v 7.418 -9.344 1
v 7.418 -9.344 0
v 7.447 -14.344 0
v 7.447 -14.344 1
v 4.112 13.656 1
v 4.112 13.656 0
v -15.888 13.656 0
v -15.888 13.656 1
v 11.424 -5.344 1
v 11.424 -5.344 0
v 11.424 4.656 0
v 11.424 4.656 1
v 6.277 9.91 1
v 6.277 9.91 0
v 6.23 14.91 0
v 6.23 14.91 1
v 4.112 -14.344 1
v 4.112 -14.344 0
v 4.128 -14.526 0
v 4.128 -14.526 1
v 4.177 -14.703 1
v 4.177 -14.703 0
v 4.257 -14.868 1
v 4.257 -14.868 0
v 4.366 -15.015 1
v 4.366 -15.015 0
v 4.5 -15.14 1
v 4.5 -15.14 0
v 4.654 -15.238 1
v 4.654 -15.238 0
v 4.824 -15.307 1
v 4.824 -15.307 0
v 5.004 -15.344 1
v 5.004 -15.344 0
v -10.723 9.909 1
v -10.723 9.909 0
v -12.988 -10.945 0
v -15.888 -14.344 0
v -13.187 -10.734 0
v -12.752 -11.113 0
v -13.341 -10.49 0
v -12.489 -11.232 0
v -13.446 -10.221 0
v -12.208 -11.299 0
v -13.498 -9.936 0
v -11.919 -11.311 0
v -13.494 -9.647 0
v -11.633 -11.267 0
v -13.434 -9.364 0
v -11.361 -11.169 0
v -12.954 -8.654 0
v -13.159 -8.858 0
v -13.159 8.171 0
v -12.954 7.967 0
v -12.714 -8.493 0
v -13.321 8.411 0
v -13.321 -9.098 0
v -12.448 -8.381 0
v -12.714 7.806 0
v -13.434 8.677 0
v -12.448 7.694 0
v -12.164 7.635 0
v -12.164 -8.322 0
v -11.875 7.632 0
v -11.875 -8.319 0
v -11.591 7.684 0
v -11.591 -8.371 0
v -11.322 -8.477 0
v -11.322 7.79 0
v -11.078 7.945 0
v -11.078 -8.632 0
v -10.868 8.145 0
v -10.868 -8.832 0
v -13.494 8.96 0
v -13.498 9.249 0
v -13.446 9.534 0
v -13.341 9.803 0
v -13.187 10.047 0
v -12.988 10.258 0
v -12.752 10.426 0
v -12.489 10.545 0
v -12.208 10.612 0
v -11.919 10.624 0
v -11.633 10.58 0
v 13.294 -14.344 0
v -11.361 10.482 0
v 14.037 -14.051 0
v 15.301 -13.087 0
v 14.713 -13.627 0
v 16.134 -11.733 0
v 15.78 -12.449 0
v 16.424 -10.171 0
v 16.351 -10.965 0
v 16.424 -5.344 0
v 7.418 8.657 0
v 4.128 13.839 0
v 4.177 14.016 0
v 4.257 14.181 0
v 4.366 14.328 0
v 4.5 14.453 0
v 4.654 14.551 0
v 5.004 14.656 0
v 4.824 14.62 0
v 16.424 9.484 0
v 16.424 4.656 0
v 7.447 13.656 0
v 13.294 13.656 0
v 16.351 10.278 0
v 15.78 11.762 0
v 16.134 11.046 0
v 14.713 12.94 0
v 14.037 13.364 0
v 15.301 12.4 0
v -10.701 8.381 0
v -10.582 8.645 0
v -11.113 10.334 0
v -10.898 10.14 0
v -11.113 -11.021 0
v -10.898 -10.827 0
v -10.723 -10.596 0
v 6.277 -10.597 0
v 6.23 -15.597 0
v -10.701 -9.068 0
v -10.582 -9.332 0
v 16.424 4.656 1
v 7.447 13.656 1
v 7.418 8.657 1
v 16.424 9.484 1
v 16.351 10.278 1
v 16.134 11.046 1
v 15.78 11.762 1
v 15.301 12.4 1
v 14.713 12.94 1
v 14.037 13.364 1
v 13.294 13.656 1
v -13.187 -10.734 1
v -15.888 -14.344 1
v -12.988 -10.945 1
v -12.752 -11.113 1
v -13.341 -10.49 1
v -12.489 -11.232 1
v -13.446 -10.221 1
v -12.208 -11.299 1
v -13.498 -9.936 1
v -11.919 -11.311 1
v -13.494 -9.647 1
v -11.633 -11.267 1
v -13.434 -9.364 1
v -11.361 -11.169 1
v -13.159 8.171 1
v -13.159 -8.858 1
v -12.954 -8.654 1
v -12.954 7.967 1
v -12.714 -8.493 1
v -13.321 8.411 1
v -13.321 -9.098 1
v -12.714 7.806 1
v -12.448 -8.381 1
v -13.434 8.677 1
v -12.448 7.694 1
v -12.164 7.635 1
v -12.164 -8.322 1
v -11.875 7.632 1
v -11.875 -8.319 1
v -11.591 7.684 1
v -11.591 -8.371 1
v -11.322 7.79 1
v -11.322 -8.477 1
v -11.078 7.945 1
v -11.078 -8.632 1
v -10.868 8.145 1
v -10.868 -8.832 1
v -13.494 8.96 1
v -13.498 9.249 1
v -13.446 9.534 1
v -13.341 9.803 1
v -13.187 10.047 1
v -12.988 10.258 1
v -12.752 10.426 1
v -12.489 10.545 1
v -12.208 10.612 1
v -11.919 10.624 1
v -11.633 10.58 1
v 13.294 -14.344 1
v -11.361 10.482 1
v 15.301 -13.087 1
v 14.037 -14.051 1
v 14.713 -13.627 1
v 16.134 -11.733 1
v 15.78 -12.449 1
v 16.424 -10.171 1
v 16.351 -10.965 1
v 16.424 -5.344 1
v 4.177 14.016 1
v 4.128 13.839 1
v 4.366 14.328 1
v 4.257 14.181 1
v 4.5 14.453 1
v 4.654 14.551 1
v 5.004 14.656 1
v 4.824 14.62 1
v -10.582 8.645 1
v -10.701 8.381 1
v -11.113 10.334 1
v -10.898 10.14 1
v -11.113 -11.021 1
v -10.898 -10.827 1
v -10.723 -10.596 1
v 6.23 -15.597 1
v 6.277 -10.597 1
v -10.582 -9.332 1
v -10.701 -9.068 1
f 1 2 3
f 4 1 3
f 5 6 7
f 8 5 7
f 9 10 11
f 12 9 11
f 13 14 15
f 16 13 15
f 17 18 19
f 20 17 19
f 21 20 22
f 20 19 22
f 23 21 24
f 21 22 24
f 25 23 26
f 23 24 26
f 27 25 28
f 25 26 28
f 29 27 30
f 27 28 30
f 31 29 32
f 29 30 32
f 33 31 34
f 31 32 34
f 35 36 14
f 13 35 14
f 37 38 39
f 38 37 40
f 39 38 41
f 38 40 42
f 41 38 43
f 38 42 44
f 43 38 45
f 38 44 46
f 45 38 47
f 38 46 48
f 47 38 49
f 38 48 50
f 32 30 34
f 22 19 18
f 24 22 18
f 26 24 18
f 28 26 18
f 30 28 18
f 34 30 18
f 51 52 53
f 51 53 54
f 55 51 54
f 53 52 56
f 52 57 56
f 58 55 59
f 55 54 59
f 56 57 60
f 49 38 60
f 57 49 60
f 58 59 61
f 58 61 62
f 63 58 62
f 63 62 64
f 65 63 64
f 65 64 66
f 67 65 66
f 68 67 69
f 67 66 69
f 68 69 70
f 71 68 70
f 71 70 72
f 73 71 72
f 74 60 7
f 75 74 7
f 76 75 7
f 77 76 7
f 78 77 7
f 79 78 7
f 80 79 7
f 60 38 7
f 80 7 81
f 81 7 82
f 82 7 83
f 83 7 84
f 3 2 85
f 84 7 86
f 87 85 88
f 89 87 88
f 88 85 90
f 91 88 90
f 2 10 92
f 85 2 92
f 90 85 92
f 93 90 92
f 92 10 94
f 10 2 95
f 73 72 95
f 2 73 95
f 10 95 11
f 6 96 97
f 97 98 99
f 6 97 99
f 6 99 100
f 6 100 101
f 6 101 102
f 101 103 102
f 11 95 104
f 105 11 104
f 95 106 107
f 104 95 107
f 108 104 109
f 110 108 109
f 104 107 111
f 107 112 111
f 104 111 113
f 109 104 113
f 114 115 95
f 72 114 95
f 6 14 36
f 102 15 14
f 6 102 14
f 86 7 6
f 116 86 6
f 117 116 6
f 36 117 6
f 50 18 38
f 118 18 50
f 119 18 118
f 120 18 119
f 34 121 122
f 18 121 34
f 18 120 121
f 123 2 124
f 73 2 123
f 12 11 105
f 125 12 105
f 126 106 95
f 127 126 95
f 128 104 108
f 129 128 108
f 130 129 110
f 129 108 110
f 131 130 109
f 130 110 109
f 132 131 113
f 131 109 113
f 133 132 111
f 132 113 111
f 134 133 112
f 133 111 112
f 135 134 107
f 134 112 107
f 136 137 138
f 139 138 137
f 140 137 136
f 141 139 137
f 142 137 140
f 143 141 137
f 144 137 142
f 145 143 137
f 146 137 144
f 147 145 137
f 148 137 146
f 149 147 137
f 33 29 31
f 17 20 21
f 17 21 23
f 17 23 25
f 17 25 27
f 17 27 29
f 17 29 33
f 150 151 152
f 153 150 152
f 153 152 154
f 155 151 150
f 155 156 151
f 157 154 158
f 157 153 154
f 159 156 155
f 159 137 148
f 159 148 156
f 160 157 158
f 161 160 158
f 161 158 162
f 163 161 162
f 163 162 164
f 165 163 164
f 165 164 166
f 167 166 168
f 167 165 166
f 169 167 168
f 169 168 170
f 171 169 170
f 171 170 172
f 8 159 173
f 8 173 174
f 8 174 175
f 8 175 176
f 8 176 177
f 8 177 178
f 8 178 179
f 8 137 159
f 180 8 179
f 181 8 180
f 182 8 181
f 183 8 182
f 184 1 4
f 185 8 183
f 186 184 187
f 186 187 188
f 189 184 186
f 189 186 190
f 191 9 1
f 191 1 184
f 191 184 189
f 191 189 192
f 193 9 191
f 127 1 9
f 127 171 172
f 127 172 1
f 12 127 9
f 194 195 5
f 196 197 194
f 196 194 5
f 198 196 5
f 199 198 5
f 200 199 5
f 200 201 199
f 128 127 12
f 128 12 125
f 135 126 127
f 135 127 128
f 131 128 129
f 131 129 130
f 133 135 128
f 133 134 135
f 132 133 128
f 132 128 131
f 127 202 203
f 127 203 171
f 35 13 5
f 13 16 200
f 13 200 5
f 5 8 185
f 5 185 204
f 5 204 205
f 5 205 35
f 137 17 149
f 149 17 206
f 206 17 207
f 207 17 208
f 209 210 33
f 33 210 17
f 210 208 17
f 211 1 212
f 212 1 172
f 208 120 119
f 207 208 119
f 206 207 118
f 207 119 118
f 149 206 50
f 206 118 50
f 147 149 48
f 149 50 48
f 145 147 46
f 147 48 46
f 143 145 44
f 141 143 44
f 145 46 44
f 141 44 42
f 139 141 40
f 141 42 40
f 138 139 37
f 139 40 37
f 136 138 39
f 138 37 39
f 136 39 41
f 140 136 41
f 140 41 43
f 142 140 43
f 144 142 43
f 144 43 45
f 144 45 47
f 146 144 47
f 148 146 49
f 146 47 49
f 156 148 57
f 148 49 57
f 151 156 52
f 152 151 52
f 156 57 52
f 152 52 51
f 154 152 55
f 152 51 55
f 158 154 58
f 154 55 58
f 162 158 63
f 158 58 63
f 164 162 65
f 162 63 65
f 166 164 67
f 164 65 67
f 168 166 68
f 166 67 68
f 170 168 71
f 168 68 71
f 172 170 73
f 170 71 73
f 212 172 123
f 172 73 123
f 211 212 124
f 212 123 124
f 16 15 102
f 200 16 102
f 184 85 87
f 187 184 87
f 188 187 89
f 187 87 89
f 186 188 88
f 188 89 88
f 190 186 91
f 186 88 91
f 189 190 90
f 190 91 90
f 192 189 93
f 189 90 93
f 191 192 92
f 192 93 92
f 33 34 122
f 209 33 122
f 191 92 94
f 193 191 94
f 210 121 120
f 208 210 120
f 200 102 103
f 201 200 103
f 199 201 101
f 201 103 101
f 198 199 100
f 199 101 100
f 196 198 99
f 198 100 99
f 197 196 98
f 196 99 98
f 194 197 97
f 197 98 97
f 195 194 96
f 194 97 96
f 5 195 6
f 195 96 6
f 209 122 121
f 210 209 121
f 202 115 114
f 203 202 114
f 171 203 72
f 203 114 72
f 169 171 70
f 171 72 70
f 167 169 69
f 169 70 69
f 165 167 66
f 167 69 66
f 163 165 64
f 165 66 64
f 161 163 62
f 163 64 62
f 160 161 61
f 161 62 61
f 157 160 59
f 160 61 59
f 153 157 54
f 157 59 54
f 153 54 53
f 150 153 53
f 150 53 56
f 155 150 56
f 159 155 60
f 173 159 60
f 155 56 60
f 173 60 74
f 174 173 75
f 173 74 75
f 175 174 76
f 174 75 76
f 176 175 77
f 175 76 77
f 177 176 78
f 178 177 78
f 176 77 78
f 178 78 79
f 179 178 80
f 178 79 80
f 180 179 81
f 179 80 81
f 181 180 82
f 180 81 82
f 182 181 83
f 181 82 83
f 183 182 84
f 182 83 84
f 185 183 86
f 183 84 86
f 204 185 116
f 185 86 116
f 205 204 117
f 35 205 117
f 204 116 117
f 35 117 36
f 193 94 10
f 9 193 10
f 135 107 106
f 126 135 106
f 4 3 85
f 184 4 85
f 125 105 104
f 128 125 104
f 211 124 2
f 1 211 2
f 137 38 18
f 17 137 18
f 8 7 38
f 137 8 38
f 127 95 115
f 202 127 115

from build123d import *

# Parameters (mm, degrees)
F1_DEPTH = 1


with BuildPart() as f1:
    # F0 (on Top) → F1 (new body)
    with BuildSketch(Plane.XY):
        with BuildLine():
            Line((12.941082, 13.656496), (7.447495, 13.656496))
            Line((7.447495, 13.656496), (7.417744, 8.656584))
            Line((7.417744, 8.656584), (-10.582252, 8.64454))
            ThreePointArc((-10.582252, 8.64454), (-13.493531, 8.959871), (-10.723445, 9.909398))
            Line((-10.723445, 9.909398), (6.276555, 9.910218))
            Line((6.276555, 9.910218), (6.230077, 14.910002))
            Line((6.230077, 14.910002), (5.003915, 14.656496))
            ThreePointArc((5.003915, 14.656496), (4.365699, 14.327975), (4.112004, 13.656496))
            Line((4.112004, 13.656496), (-15.887996, 13.656496))
            Line((-15.887996, 13.656496), (-15.887996, -14.343504))
            Line((-15.887996, -14.343504), (4.112004, -14.343504))
            ThreePointArc((4.112004, -14.343504), (4.365699, -15.014984), (5.003915, -15.343504))
            Line((5.003915, -15.343504), (6.230077, -15.597011))
            Line((6.230077, -15.597011), (6.276555, -10.597227))
            Line((6.276555, -10.597227), (-10.723445, -10.596407))
            ThreePointArc((-10.723445, -10.596407), (-13.493531, -9.646879), (-10.582252, -9.331549))
            Line((-10.582252, -9.331549), (7.417744, -9.343593))
            Line((7.417744, -9.343593), (7.447495, -14.343504))
            Line((7.447495, -14.343504), (13.294204, -14.343504))
            ThreePointArc((13.294204, -14.343504), (15.554923, -12.77892), (16.424473, -10.17073))
            Line((16.424473, -10.17073), (16.424473, -5.343504))
            Line((16.424473, -5.343504), (11.424473, -5.343504))
            Line((11.424473, -5.343504), (11.424473, 4.656496))
            Line((11.424473, 4.656496), (12.941082, 4.656496))
            Line((12.941082, 4.656496), (12.941082, 13.656496))
        make_face()
        with BuildLine():
            Line((13.294204, 13.656496), (12.941082, 13.656496))
            Line((12.941082, 13.656496), (12.941082, 4.656496))
            Line((12.941082, 4.656496), (16.424473, 4.656496))
            Line((16.424473, 4.656496), (16.424473, 9.483721))
            ThreePointArc((16.424473, 9.483721), (15.554923, 12.091912), (13.294204, 13.656496))
        make_face()
    extrude(amount=F1_DEPTH)


solid = f1.part
